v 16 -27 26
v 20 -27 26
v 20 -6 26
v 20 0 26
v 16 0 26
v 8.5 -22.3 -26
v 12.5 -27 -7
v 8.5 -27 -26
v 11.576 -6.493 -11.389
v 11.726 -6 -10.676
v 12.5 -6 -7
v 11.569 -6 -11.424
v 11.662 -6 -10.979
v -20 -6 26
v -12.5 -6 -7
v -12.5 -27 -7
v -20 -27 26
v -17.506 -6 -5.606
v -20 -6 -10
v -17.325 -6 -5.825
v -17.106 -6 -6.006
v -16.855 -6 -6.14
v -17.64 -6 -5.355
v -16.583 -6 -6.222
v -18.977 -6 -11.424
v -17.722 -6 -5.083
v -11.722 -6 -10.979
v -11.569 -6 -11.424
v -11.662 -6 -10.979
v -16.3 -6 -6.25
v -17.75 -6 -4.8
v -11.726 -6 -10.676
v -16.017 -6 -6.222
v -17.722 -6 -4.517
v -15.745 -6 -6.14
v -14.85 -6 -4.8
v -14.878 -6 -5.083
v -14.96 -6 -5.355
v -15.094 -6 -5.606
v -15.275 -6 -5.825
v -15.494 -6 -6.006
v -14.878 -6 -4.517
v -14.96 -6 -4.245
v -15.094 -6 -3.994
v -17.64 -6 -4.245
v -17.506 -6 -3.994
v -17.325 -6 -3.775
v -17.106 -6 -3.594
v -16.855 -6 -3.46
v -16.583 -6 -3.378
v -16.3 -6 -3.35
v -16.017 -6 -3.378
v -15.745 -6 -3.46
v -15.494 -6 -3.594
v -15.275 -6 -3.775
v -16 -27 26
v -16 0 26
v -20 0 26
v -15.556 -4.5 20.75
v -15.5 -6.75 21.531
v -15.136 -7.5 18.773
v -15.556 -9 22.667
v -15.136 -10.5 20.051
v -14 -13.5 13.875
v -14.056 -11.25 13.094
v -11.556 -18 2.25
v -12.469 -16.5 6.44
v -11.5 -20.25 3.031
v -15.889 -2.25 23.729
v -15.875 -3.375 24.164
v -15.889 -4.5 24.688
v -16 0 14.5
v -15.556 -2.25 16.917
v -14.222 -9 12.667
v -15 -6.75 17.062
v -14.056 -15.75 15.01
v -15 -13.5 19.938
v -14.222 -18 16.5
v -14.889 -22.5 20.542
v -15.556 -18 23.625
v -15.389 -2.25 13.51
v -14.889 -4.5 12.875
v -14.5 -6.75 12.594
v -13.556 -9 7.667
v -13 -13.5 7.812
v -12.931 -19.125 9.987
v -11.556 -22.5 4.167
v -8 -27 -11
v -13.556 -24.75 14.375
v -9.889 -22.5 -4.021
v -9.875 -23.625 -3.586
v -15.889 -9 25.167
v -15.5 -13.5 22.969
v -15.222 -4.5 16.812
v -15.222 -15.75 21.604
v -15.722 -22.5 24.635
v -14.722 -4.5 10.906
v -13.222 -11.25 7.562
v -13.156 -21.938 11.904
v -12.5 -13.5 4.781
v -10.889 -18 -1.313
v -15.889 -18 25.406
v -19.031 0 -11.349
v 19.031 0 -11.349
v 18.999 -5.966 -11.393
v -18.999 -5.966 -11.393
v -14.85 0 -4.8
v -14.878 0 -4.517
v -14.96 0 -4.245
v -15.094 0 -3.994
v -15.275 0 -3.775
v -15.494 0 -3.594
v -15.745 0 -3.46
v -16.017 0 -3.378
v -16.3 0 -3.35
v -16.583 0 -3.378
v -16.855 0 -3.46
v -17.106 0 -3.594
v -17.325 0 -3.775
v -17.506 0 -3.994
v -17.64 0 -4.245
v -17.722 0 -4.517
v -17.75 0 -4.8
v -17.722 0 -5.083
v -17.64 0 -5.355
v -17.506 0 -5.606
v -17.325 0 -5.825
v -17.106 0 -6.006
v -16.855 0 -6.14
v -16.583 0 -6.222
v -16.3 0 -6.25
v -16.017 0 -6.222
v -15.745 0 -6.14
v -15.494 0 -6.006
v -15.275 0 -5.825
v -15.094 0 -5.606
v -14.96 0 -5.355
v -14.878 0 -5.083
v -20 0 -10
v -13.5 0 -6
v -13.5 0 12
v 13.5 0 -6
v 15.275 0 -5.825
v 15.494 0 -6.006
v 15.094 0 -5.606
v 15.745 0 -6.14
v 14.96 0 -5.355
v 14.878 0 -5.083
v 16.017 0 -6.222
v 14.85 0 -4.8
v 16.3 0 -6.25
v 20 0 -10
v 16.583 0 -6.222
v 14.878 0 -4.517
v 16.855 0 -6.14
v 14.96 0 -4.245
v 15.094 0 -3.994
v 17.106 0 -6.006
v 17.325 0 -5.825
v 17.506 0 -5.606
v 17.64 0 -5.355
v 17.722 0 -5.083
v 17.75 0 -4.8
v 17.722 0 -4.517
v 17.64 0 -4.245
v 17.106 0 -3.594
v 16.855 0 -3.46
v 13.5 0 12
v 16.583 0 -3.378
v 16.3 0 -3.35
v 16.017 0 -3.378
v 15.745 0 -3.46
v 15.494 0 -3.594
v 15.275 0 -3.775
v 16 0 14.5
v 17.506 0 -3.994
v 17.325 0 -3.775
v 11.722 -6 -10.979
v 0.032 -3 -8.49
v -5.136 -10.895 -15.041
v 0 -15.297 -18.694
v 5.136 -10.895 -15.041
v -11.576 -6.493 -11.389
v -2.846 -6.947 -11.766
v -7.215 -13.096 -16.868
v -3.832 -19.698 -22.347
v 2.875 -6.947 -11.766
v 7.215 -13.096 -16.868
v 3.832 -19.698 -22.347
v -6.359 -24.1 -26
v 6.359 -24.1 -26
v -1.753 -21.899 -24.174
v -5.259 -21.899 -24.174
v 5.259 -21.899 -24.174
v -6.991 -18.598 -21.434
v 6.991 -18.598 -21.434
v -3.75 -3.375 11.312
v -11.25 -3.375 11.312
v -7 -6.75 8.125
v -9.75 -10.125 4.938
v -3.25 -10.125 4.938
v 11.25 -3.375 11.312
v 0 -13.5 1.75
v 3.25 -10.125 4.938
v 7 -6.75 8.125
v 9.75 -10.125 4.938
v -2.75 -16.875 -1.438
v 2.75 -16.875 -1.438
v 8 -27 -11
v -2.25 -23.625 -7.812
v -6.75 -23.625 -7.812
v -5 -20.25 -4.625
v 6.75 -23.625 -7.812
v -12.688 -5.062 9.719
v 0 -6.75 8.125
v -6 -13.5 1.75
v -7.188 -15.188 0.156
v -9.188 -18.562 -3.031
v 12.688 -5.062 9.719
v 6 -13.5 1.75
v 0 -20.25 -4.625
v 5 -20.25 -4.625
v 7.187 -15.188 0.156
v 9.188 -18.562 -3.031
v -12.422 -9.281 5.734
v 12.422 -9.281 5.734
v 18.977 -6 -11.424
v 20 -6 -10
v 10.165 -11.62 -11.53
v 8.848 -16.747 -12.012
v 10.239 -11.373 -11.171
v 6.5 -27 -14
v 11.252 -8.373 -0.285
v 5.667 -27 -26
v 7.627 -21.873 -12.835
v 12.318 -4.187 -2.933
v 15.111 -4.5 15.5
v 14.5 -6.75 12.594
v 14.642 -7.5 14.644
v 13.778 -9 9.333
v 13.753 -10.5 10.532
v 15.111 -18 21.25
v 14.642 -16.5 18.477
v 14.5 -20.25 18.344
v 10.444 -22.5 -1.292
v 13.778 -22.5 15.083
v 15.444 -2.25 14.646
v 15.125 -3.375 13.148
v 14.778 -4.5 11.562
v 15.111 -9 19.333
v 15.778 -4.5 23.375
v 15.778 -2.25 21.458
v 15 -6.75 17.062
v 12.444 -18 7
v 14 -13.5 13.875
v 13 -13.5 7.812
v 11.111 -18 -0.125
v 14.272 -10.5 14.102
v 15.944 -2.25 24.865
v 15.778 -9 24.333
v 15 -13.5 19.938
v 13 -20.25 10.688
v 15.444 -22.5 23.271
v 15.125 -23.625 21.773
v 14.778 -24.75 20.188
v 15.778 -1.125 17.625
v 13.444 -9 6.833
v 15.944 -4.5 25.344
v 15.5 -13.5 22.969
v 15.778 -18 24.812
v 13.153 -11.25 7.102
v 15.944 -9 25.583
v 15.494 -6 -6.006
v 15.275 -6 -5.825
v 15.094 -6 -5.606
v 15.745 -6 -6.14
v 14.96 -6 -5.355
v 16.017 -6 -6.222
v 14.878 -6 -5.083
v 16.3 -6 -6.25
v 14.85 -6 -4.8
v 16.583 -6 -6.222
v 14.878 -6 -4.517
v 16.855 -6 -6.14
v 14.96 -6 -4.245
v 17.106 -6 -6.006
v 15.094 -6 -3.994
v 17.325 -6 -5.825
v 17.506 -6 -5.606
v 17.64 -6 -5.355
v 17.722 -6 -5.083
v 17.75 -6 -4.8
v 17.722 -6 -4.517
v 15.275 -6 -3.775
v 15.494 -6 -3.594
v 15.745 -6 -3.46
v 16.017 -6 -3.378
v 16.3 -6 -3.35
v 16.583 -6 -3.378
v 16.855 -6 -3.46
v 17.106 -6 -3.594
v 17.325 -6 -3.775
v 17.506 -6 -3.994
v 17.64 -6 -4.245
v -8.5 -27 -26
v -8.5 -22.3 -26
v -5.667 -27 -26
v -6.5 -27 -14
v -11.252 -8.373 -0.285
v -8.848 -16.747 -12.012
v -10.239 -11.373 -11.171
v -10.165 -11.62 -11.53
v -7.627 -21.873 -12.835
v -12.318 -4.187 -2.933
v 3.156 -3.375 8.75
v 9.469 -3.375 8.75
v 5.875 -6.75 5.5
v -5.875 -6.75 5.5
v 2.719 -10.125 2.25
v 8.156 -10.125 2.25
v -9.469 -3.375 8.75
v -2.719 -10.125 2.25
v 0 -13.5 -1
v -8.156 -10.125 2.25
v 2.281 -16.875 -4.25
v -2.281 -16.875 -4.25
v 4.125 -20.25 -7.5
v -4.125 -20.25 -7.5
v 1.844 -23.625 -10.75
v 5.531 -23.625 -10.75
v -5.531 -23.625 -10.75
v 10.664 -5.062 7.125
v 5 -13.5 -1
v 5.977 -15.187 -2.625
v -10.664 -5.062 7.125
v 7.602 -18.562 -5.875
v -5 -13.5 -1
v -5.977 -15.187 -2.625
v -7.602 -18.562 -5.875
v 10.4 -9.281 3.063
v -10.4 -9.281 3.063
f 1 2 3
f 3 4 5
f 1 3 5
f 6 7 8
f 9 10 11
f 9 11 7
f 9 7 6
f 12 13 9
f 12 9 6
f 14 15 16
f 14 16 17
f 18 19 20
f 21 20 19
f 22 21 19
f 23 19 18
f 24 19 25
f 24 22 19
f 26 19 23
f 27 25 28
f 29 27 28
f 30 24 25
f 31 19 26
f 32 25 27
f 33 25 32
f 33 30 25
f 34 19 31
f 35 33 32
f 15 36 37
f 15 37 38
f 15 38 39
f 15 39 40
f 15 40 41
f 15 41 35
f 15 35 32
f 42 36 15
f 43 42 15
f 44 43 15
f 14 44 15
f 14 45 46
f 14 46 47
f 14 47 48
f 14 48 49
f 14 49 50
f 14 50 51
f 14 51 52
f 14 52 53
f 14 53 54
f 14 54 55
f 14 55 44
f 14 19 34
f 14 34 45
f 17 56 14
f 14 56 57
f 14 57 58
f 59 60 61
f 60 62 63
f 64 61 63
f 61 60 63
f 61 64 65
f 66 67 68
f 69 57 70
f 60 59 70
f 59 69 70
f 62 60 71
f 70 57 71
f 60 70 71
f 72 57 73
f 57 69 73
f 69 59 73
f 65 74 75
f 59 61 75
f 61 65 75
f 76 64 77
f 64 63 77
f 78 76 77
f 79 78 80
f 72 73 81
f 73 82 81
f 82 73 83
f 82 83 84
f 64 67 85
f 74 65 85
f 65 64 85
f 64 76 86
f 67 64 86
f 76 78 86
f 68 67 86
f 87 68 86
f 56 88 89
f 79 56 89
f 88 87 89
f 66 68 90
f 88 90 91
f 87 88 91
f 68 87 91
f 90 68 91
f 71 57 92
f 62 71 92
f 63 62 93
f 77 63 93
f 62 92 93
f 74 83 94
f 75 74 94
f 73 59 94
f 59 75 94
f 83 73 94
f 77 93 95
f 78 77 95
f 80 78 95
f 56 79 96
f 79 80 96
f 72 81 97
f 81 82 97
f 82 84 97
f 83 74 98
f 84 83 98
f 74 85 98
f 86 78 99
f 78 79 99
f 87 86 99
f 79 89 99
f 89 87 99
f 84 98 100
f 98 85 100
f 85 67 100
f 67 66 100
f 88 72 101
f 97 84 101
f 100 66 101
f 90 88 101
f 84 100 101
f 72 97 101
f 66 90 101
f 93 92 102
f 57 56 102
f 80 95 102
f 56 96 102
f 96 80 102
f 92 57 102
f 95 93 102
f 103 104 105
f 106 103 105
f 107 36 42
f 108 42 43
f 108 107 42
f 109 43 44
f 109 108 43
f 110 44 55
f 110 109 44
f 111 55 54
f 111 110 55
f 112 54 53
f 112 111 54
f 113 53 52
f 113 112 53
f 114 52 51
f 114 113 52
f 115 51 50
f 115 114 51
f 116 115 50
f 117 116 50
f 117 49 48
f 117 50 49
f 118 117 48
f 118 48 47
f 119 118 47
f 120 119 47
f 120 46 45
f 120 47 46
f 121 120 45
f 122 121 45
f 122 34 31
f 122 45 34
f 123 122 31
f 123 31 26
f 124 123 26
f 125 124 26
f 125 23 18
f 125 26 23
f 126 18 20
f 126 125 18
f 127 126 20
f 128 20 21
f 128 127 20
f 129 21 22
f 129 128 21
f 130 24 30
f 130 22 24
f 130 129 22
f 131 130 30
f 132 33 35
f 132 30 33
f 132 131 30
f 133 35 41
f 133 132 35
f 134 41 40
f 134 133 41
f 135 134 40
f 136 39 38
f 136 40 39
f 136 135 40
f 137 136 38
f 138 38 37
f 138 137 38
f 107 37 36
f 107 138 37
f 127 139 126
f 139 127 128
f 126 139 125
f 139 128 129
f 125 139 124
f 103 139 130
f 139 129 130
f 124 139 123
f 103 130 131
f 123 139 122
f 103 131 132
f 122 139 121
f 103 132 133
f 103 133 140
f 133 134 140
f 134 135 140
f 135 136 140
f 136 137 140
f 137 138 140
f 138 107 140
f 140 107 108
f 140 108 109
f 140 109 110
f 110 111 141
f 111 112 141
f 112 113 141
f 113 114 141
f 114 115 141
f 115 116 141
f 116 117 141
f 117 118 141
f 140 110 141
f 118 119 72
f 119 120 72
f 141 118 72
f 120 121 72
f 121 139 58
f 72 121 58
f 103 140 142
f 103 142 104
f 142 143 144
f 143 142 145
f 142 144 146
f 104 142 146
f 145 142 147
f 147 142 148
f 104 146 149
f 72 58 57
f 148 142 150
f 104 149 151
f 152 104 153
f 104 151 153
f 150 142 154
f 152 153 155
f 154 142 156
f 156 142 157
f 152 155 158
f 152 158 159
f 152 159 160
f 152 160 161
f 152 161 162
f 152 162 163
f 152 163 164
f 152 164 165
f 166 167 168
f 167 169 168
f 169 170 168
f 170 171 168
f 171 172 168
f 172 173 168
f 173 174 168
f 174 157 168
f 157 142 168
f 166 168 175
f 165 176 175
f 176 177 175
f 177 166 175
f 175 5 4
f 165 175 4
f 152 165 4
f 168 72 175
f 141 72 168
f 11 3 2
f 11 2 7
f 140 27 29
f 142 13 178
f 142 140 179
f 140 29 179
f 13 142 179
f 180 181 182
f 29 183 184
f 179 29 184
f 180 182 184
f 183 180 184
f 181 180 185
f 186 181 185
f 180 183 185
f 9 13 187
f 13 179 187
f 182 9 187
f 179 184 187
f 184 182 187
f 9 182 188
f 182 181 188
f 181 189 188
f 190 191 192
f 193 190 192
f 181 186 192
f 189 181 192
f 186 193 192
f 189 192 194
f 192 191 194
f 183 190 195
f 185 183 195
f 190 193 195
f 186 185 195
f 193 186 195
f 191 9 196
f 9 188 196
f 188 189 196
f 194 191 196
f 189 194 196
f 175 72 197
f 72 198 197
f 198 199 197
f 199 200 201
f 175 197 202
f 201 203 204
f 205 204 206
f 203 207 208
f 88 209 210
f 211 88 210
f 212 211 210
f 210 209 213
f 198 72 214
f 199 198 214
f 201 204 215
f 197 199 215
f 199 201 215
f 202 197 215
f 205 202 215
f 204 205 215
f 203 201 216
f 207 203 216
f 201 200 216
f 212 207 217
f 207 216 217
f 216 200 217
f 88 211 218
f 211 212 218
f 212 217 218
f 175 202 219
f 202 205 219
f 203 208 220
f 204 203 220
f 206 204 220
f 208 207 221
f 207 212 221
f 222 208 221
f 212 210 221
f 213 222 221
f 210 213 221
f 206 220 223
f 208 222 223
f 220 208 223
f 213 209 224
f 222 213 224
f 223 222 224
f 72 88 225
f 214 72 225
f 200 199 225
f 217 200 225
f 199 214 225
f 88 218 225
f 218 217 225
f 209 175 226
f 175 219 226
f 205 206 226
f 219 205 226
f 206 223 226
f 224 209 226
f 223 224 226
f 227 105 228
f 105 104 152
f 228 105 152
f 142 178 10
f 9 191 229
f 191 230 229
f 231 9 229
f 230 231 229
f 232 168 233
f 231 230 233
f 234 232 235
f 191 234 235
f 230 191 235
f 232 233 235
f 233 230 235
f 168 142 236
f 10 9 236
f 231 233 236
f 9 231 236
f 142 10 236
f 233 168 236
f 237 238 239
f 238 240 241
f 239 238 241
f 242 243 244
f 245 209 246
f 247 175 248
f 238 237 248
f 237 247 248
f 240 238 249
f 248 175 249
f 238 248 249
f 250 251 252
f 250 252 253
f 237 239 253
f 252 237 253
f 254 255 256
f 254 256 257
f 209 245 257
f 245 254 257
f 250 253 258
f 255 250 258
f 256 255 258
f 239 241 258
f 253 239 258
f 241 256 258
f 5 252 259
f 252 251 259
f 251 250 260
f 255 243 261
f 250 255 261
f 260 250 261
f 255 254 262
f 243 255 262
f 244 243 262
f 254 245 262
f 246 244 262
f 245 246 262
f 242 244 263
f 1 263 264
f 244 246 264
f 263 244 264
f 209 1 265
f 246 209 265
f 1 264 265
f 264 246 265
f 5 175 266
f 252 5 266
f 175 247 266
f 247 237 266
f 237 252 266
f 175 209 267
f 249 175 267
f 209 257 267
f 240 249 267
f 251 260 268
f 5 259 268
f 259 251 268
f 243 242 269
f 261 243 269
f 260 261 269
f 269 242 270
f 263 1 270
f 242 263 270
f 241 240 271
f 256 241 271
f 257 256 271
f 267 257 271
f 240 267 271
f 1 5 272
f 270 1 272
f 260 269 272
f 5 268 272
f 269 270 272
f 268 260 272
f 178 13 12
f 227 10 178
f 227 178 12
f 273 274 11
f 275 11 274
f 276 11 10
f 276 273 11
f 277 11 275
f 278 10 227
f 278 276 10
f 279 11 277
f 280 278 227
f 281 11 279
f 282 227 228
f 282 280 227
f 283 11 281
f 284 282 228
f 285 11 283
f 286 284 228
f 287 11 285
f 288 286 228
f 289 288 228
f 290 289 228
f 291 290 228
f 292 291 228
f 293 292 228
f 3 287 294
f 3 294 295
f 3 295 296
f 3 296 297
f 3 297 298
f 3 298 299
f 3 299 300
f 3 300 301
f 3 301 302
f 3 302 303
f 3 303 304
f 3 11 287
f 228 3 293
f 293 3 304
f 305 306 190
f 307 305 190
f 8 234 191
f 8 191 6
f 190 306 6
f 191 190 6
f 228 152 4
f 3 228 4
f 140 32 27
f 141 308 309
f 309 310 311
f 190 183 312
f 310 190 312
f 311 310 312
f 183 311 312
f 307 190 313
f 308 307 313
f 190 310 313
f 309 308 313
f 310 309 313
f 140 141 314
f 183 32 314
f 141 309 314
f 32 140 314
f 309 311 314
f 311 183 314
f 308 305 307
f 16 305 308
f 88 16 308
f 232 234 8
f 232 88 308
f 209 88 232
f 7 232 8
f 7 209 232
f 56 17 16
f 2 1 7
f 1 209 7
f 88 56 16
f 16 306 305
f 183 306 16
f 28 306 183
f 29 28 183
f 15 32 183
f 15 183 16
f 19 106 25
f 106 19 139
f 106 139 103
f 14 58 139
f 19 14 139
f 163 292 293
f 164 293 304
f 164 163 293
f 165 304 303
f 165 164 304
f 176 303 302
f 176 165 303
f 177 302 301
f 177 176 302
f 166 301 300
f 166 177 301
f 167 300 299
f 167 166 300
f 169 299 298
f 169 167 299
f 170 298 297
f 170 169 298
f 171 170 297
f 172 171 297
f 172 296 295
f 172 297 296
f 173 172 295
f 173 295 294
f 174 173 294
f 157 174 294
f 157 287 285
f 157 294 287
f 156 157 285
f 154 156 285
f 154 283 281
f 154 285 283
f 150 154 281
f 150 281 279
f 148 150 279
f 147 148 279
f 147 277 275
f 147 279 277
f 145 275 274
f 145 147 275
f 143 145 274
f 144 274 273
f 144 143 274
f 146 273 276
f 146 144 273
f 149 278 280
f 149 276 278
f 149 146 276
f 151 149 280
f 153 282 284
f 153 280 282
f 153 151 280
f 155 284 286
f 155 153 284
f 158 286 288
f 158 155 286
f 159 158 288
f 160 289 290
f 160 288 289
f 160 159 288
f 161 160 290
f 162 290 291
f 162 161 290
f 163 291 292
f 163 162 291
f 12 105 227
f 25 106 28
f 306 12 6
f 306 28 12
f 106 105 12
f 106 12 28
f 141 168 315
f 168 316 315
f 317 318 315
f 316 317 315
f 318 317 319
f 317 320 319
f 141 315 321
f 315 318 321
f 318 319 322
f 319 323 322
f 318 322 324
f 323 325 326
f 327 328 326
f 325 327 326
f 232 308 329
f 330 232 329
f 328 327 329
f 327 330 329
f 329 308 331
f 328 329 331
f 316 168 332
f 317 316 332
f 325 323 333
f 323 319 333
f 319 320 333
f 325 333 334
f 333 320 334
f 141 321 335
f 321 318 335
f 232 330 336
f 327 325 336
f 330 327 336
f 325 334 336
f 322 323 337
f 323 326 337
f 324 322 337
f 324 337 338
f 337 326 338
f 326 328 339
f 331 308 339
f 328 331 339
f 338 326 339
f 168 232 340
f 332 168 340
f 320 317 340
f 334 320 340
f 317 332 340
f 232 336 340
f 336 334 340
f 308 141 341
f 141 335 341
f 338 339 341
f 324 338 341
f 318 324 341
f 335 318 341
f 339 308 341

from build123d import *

# Parameters (mm, degrees)
F0_R          = 1.45
F1_DEPTH      = 27
F3_START      = 6
F3_DEPTH      = 23
F6_W          = 32
F6_H          = 11.5
F9_DEPTH      = 25
F9_DEPTH_BACK = 25
F6_W_2        = 27
F6_H_2        = 18


with BuildPart() as f1:
    # F0 (on Front) → F1 (new body)
    with BuildSketch(Plane.XZ):
        Polygon((-8.5, -26), (8.5, -26), (20, -10), (20, 26), (-20, 26), (-20, -10), align=None)
        with Locations((-16.3, -4.8)):
            Circle(F0_R, mode=Mode.SUBTRACT)
        with Locations((16.3, -4.8)):
            Circle(F0_R, mode=Mode.SUBTRACT)
    extrude(amount=F1_DEPTH)

    # F2 (on Front) → F3 (cut)
    with BuildSketch(Plane.XZ.offset(F3_START)):
        Polygon((26.5, -25), (26.499954751, 0.0001809961), (20, 26), (12.5, -7), (8.5, -26), align=None)
        Polygon((-8.5, -26), (-12.5, -7), (-20, 26), (-26.499954751, 0.0001809961), (-26.5, -25), align=None)
    extrude(amount=F3_DEPTH, mode=Mode.SUBTRACT)

    # F6 (on Front) → F7 section 0
    with BuildSketch(Plane.XZ):
        with Locations((0, 20.25)):
            Rectangle(F6_W, F6_H)
    # F5 (on offset) → F7 section 1
    with BuildSketch(Plane.XZ.offset(27)):
        Polygon((8, -11), (16, 26), (-16, 26), (-8, -11), align=None)
    loft(mode=Mode.SUBTRACT)

    # F8 (on Right) → F9 (cut, two sides)
    with BuildSketch(Plane.YZ) as f9_sk:
        Polygon((-5.9656337835, -11.392949149), (-27.1901637316, -30.3732156754), (3.7769323681, -39.4357405603), (2.9211663641, -11.3271204755), align=None)
    extrude(amount=-F9_DEPTH, mode=Mode.SUBTRACT)
    extrude(f9_sk.sketch, amount=F9_DEPTH_BACK, mode=Mode.SUBTRACT)

    # F6 (on Front) → F10 section 0
    with BuildSketch(Plane.XZ):
        with Locations((0, 3)):
            Rectangle(F6_W_2, F6_H_2)
    # F5 (on offset) → F10 section 1
    with BuildSketch(Plane.XZ.offset(27)):
        Polygon((5.5, -28.406675905), (6.5, -14), (-6.5, -14), (-5.5, -28.406675905), align=None)
    loft(mode=Mode.SUBTRACT)


solid = f1.part
